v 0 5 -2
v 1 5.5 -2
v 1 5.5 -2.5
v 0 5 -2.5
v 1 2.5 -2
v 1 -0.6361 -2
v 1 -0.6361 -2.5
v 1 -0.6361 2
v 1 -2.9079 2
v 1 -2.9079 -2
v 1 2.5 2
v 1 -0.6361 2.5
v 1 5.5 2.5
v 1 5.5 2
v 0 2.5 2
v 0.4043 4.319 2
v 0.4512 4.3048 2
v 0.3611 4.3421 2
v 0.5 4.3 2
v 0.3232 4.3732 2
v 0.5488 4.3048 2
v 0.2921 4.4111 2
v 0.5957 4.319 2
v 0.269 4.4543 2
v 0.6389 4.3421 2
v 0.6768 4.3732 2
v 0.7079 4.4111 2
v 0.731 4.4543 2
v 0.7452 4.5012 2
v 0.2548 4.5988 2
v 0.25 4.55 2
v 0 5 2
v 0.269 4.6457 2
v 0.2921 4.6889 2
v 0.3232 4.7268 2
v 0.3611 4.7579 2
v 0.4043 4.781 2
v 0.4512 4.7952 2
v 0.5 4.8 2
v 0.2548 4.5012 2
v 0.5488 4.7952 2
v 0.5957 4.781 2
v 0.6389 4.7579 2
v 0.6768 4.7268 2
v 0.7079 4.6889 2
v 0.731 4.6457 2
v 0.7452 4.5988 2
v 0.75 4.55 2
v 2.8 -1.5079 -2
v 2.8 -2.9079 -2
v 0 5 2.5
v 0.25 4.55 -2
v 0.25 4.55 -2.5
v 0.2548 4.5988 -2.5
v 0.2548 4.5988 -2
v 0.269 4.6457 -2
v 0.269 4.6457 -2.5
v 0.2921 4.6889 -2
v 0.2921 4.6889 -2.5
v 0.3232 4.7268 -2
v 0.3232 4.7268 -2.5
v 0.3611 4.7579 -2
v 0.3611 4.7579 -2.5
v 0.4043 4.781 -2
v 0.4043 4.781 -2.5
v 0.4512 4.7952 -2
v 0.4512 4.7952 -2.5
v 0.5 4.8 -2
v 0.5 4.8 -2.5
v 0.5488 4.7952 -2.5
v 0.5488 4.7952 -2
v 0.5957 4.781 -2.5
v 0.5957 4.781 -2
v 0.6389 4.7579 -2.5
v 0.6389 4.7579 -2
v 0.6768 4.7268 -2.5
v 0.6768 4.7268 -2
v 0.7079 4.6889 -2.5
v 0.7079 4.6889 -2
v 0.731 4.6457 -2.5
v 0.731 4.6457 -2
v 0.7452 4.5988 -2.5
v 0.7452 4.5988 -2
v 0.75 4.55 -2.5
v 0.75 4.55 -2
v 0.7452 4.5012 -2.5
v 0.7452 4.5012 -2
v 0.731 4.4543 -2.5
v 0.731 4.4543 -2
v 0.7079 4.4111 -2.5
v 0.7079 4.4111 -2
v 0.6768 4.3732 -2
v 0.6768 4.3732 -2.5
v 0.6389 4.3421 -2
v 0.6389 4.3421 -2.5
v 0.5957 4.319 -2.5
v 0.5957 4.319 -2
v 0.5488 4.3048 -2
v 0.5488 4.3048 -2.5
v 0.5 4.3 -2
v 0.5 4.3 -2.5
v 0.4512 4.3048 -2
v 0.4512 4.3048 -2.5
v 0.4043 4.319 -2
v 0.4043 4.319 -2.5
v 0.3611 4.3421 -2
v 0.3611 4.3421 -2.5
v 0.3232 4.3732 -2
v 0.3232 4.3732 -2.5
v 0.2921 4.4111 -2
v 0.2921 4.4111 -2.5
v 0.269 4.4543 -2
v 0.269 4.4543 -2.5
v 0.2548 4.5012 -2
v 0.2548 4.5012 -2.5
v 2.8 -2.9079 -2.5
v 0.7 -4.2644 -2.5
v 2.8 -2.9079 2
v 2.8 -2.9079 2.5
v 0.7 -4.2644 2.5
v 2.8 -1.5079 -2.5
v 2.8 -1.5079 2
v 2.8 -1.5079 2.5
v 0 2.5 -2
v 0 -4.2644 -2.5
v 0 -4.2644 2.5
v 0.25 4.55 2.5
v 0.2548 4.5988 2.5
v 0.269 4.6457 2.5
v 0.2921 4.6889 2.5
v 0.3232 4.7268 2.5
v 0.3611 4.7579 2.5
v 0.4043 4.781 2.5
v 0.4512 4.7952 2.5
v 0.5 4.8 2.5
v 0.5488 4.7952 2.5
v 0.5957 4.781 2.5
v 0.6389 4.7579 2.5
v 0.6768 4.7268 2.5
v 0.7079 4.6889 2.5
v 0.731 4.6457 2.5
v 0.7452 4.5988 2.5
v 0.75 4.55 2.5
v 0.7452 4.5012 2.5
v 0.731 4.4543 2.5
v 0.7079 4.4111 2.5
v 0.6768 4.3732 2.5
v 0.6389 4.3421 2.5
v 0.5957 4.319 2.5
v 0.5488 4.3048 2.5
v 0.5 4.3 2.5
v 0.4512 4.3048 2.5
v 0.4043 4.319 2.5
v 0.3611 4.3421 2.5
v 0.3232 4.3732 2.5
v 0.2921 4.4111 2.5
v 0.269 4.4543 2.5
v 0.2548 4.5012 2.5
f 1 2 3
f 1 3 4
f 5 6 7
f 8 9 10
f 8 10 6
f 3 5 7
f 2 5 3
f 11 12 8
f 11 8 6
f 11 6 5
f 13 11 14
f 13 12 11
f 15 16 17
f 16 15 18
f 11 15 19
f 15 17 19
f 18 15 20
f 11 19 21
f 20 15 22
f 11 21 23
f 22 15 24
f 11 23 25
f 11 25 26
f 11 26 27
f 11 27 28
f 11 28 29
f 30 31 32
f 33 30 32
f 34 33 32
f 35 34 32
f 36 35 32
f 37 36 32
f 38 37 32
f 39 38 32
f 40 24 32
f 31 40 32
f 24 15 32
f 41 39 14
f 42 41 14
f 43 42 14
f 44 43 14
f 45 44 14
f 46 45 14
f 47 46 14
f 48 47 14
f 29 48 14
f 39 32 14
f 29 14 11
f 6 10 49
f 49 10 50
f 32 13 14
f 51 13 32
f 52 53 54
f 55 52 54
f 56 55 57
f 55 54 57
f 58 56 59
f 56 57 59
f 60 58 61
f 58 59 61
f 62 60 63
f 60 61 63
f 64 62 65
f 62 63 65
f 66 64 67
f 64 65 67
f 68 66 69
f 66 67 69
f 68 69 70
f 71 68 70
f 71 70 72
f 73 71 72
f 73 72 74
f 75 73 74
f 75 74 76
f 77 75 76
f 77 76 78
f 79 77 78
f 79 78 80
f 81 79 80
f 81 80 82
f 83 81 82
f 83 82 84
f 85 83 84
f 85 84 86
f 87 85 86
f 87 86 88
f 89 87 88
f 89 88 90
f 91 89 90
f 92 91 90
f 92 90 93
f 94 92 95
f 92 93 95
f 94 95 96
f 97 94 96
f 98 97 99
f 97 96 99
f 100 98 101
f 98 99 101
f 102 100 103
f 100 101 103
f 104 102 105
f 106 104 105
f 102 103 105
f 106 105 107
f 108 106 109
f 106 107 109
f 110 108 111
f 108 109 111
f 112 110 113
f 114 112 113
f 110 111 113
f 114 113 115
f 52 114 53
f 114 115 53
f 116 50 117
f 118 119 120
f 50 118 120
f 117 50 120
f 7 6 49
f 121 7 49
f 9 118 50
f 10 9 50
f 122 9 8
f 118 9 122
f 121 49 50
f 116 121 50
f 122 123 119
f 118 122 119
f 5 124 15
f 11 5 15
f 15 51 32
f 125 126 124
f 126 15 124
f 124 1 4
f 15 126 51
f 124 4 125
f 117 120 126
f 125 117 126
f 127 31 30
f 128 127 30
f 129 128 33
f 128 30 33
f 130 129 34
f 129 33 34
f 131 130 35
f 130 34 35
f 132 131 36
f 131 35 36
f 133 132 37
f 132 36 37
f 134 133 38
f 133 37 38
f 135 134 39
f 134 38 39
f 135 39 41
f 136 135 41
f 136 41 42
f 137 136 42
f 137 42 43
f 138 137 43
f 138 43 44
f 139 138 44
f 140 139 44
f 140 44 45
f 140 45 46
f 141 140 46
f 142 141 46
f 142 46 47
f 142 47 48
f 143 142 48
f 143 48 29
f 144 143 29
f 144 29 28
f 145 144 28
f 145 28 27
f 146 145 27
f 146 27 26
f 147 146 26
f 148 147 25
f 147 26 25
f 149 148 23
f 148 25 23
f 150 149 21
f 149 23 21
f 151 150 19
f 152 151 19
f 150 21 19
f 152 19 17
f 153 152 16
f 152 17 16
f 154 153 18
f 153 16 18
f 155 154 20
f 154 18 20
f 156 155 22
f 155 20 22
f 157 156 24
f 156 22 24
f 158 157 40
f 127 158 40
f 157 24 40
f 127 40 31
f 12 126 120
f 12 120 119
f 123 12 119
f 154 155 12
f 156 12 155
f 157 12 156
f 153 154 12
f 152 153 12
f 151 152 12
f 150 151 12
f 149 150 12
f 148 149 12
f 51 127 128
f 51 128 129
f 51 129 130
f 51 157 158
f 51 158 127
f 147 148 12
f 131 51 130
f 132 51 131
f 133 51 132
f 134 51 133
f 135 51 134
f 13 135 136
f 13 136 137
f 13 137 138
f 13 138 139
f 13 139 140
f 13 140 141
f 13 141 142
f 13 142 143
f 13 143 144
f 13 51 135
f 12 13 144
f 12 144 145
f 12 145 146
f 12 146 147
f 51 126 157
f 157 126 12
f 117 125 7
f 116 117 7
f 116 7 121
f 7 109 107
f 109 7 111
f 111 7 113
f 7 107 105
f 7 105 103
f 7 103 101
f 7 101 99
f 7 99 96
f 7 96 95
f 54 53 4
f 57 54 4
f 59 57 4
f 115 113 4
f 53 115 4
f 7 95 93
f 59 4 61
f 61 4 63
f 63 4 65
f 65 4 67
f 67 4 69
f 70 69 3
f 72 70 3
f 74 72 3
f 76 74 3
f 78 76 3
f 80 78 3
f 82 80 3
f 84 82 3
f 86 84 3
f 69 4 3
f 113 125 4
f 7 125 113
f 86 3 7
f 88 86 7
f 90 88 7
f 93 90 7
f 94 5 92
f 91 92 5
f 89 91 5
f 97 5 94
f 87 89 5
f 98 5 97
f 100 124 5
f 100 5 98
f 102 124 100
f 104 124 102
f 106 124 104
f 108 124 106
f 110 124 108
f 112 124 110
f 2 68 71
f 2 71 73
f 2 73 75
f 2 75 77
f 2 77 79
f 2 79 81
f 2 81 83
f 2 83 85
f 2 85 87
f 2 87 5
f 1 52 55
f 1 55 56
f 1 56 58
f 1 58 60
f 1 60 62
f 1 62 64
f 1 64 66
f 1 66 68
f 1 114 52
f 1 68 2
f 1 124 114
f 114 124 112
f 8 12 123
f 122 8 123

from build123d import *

# Parameters (mm, degrees)
SKETCH_1_W          = 5
SKETCH_1_H          = 10
EXTRUDE_1_DEPTH     = 8
CUT_EXTRUDE_1_DEPTH = 8
EXTRUDE_2_DEPTH     = 5
SKETCH_5_W          = 4
SKETCH_5_H          = 2.5
CUT_EXTRUDE_2_DEPTH = 5
SKETCH_4_W          = 1.118033989
SKETCH_4_H          = 4
CUT_EXTRUDE_3_DEPTH = 5
SKETCH_8_W          = 4
SKETCH_8_H          = 1.4
CUT_EXTRUDE_4_DEPTH = 1.8
SKETCH_10_W         = 1.8
SKETCH_10_H         = 4
CUT_EXTRUDE_5_DEPTH = 2
SKETCH_11_R         = 0.25
CUT_EXTRUDE_6_DEPTH = 10


with BuildPart() as part:
    # 草图1 → 凸台-拉伸1 (new body)
    with BuildSketch(Plane(origin=(0, 0, 0), x_dir=(0, 0, -1), z_dir=(1, 0, 0))):
        Rectangle(SKETCH_1_W, SKETCH_1_H)
    extrude(amount=EXTRUDE_1_DEPTH)

    # 草图2 → 切除-拉伸1 (cut)
    with BuildSketch(Plane.XY.offset(2.5)):
        Polygon((8, 5), (1, 5), (1, -0.636116149), (2.8, -1.507895938), (2.8, -2.907895938), (0.7, -4.264361935), (0, -4.264361935), (0, -5), (8, -5), align=None)
    extrude(amount=-CUT_EXTRUDE_1_DEPTH, mode=Mode.SUBTRACT)

    # 草图3 → 凸台-拉伸2 (add)
    with BuildSketch(Plane.XY.offset(2.5)):
        Polygon((1, 5), (1, 5.5), (0, 5), align=None)
    extrude(amount=-EXTRUDE_2_DEPTH)

    # 草图5 → 切除-拉伸2 (cut)
    with BuildSketch(Plane.ZY):
        with Locations((0, 3.75)):
            Rectangle(SKETCH_5_W, SKETCH_5_H)
    extrude(amount=-CUT_EXTRUDE_2_DEPTH, mode=Mode.SUBTRACT)

    # 草图4 → 切除-拉伸3 (cut)
    with BuildSketch(Plane(origin=(-2, 4, 0), x_dir=(0.8944271909999156, 0.44721359549995865, 0), z_dir=(-0.44721359549995865, 0.8944271909999156, 0))):
        with Locations((2.795084972, 0)):
            Rectangle(SKETCH_4_W, SKETCH_4_H)
    extrude(amount=-CUT_EXTRUDE_3_DEPTH, mode=Mode.SUBTRACT)

    # 草图8 → 切除-拉伸4 (cut)
    with BuildSketch(Plane(origin=(2.8, 0, 0), x_dir=(0, 0, -1), z_dir=(1, 0, 0))):
        with Locations((0, -2.207895938)):
            Rectangle(SKETCH_8_W, SKETCH_8_H)
    extrude(amount=-CUT_EXTRUDE_4_DEPTH, mode=Mode.SUBTRACT)

    # 草图10 → 切除-拉伸5 (cut)
    with BuildSketch(Plane.XZ.offset(1.507895938)):
        with Locations((1.9, 0)):
            Rectangle(SKETCH_10_W, SKETCH_10_H)
    extrude(amount=-CUT_EXTRUDE_5_DEPTH, mode=Mode.SUBTRACT)

    # 草图11 → 切除-拉伸6 (cut)
    with BuildSketch(Plane(origin=(0, 0, -2.5), x_dir=(-1, 0, 0), z_dir=(0, 0, -1))):
        with Locations((-0.5, 4.55)):
            Circle(SKETCH_11_R)
    extrude(amount=-CUT_EXTRUDE_6_DEPTH, mode=Mode.SUBTRACT)


solid = part.part
